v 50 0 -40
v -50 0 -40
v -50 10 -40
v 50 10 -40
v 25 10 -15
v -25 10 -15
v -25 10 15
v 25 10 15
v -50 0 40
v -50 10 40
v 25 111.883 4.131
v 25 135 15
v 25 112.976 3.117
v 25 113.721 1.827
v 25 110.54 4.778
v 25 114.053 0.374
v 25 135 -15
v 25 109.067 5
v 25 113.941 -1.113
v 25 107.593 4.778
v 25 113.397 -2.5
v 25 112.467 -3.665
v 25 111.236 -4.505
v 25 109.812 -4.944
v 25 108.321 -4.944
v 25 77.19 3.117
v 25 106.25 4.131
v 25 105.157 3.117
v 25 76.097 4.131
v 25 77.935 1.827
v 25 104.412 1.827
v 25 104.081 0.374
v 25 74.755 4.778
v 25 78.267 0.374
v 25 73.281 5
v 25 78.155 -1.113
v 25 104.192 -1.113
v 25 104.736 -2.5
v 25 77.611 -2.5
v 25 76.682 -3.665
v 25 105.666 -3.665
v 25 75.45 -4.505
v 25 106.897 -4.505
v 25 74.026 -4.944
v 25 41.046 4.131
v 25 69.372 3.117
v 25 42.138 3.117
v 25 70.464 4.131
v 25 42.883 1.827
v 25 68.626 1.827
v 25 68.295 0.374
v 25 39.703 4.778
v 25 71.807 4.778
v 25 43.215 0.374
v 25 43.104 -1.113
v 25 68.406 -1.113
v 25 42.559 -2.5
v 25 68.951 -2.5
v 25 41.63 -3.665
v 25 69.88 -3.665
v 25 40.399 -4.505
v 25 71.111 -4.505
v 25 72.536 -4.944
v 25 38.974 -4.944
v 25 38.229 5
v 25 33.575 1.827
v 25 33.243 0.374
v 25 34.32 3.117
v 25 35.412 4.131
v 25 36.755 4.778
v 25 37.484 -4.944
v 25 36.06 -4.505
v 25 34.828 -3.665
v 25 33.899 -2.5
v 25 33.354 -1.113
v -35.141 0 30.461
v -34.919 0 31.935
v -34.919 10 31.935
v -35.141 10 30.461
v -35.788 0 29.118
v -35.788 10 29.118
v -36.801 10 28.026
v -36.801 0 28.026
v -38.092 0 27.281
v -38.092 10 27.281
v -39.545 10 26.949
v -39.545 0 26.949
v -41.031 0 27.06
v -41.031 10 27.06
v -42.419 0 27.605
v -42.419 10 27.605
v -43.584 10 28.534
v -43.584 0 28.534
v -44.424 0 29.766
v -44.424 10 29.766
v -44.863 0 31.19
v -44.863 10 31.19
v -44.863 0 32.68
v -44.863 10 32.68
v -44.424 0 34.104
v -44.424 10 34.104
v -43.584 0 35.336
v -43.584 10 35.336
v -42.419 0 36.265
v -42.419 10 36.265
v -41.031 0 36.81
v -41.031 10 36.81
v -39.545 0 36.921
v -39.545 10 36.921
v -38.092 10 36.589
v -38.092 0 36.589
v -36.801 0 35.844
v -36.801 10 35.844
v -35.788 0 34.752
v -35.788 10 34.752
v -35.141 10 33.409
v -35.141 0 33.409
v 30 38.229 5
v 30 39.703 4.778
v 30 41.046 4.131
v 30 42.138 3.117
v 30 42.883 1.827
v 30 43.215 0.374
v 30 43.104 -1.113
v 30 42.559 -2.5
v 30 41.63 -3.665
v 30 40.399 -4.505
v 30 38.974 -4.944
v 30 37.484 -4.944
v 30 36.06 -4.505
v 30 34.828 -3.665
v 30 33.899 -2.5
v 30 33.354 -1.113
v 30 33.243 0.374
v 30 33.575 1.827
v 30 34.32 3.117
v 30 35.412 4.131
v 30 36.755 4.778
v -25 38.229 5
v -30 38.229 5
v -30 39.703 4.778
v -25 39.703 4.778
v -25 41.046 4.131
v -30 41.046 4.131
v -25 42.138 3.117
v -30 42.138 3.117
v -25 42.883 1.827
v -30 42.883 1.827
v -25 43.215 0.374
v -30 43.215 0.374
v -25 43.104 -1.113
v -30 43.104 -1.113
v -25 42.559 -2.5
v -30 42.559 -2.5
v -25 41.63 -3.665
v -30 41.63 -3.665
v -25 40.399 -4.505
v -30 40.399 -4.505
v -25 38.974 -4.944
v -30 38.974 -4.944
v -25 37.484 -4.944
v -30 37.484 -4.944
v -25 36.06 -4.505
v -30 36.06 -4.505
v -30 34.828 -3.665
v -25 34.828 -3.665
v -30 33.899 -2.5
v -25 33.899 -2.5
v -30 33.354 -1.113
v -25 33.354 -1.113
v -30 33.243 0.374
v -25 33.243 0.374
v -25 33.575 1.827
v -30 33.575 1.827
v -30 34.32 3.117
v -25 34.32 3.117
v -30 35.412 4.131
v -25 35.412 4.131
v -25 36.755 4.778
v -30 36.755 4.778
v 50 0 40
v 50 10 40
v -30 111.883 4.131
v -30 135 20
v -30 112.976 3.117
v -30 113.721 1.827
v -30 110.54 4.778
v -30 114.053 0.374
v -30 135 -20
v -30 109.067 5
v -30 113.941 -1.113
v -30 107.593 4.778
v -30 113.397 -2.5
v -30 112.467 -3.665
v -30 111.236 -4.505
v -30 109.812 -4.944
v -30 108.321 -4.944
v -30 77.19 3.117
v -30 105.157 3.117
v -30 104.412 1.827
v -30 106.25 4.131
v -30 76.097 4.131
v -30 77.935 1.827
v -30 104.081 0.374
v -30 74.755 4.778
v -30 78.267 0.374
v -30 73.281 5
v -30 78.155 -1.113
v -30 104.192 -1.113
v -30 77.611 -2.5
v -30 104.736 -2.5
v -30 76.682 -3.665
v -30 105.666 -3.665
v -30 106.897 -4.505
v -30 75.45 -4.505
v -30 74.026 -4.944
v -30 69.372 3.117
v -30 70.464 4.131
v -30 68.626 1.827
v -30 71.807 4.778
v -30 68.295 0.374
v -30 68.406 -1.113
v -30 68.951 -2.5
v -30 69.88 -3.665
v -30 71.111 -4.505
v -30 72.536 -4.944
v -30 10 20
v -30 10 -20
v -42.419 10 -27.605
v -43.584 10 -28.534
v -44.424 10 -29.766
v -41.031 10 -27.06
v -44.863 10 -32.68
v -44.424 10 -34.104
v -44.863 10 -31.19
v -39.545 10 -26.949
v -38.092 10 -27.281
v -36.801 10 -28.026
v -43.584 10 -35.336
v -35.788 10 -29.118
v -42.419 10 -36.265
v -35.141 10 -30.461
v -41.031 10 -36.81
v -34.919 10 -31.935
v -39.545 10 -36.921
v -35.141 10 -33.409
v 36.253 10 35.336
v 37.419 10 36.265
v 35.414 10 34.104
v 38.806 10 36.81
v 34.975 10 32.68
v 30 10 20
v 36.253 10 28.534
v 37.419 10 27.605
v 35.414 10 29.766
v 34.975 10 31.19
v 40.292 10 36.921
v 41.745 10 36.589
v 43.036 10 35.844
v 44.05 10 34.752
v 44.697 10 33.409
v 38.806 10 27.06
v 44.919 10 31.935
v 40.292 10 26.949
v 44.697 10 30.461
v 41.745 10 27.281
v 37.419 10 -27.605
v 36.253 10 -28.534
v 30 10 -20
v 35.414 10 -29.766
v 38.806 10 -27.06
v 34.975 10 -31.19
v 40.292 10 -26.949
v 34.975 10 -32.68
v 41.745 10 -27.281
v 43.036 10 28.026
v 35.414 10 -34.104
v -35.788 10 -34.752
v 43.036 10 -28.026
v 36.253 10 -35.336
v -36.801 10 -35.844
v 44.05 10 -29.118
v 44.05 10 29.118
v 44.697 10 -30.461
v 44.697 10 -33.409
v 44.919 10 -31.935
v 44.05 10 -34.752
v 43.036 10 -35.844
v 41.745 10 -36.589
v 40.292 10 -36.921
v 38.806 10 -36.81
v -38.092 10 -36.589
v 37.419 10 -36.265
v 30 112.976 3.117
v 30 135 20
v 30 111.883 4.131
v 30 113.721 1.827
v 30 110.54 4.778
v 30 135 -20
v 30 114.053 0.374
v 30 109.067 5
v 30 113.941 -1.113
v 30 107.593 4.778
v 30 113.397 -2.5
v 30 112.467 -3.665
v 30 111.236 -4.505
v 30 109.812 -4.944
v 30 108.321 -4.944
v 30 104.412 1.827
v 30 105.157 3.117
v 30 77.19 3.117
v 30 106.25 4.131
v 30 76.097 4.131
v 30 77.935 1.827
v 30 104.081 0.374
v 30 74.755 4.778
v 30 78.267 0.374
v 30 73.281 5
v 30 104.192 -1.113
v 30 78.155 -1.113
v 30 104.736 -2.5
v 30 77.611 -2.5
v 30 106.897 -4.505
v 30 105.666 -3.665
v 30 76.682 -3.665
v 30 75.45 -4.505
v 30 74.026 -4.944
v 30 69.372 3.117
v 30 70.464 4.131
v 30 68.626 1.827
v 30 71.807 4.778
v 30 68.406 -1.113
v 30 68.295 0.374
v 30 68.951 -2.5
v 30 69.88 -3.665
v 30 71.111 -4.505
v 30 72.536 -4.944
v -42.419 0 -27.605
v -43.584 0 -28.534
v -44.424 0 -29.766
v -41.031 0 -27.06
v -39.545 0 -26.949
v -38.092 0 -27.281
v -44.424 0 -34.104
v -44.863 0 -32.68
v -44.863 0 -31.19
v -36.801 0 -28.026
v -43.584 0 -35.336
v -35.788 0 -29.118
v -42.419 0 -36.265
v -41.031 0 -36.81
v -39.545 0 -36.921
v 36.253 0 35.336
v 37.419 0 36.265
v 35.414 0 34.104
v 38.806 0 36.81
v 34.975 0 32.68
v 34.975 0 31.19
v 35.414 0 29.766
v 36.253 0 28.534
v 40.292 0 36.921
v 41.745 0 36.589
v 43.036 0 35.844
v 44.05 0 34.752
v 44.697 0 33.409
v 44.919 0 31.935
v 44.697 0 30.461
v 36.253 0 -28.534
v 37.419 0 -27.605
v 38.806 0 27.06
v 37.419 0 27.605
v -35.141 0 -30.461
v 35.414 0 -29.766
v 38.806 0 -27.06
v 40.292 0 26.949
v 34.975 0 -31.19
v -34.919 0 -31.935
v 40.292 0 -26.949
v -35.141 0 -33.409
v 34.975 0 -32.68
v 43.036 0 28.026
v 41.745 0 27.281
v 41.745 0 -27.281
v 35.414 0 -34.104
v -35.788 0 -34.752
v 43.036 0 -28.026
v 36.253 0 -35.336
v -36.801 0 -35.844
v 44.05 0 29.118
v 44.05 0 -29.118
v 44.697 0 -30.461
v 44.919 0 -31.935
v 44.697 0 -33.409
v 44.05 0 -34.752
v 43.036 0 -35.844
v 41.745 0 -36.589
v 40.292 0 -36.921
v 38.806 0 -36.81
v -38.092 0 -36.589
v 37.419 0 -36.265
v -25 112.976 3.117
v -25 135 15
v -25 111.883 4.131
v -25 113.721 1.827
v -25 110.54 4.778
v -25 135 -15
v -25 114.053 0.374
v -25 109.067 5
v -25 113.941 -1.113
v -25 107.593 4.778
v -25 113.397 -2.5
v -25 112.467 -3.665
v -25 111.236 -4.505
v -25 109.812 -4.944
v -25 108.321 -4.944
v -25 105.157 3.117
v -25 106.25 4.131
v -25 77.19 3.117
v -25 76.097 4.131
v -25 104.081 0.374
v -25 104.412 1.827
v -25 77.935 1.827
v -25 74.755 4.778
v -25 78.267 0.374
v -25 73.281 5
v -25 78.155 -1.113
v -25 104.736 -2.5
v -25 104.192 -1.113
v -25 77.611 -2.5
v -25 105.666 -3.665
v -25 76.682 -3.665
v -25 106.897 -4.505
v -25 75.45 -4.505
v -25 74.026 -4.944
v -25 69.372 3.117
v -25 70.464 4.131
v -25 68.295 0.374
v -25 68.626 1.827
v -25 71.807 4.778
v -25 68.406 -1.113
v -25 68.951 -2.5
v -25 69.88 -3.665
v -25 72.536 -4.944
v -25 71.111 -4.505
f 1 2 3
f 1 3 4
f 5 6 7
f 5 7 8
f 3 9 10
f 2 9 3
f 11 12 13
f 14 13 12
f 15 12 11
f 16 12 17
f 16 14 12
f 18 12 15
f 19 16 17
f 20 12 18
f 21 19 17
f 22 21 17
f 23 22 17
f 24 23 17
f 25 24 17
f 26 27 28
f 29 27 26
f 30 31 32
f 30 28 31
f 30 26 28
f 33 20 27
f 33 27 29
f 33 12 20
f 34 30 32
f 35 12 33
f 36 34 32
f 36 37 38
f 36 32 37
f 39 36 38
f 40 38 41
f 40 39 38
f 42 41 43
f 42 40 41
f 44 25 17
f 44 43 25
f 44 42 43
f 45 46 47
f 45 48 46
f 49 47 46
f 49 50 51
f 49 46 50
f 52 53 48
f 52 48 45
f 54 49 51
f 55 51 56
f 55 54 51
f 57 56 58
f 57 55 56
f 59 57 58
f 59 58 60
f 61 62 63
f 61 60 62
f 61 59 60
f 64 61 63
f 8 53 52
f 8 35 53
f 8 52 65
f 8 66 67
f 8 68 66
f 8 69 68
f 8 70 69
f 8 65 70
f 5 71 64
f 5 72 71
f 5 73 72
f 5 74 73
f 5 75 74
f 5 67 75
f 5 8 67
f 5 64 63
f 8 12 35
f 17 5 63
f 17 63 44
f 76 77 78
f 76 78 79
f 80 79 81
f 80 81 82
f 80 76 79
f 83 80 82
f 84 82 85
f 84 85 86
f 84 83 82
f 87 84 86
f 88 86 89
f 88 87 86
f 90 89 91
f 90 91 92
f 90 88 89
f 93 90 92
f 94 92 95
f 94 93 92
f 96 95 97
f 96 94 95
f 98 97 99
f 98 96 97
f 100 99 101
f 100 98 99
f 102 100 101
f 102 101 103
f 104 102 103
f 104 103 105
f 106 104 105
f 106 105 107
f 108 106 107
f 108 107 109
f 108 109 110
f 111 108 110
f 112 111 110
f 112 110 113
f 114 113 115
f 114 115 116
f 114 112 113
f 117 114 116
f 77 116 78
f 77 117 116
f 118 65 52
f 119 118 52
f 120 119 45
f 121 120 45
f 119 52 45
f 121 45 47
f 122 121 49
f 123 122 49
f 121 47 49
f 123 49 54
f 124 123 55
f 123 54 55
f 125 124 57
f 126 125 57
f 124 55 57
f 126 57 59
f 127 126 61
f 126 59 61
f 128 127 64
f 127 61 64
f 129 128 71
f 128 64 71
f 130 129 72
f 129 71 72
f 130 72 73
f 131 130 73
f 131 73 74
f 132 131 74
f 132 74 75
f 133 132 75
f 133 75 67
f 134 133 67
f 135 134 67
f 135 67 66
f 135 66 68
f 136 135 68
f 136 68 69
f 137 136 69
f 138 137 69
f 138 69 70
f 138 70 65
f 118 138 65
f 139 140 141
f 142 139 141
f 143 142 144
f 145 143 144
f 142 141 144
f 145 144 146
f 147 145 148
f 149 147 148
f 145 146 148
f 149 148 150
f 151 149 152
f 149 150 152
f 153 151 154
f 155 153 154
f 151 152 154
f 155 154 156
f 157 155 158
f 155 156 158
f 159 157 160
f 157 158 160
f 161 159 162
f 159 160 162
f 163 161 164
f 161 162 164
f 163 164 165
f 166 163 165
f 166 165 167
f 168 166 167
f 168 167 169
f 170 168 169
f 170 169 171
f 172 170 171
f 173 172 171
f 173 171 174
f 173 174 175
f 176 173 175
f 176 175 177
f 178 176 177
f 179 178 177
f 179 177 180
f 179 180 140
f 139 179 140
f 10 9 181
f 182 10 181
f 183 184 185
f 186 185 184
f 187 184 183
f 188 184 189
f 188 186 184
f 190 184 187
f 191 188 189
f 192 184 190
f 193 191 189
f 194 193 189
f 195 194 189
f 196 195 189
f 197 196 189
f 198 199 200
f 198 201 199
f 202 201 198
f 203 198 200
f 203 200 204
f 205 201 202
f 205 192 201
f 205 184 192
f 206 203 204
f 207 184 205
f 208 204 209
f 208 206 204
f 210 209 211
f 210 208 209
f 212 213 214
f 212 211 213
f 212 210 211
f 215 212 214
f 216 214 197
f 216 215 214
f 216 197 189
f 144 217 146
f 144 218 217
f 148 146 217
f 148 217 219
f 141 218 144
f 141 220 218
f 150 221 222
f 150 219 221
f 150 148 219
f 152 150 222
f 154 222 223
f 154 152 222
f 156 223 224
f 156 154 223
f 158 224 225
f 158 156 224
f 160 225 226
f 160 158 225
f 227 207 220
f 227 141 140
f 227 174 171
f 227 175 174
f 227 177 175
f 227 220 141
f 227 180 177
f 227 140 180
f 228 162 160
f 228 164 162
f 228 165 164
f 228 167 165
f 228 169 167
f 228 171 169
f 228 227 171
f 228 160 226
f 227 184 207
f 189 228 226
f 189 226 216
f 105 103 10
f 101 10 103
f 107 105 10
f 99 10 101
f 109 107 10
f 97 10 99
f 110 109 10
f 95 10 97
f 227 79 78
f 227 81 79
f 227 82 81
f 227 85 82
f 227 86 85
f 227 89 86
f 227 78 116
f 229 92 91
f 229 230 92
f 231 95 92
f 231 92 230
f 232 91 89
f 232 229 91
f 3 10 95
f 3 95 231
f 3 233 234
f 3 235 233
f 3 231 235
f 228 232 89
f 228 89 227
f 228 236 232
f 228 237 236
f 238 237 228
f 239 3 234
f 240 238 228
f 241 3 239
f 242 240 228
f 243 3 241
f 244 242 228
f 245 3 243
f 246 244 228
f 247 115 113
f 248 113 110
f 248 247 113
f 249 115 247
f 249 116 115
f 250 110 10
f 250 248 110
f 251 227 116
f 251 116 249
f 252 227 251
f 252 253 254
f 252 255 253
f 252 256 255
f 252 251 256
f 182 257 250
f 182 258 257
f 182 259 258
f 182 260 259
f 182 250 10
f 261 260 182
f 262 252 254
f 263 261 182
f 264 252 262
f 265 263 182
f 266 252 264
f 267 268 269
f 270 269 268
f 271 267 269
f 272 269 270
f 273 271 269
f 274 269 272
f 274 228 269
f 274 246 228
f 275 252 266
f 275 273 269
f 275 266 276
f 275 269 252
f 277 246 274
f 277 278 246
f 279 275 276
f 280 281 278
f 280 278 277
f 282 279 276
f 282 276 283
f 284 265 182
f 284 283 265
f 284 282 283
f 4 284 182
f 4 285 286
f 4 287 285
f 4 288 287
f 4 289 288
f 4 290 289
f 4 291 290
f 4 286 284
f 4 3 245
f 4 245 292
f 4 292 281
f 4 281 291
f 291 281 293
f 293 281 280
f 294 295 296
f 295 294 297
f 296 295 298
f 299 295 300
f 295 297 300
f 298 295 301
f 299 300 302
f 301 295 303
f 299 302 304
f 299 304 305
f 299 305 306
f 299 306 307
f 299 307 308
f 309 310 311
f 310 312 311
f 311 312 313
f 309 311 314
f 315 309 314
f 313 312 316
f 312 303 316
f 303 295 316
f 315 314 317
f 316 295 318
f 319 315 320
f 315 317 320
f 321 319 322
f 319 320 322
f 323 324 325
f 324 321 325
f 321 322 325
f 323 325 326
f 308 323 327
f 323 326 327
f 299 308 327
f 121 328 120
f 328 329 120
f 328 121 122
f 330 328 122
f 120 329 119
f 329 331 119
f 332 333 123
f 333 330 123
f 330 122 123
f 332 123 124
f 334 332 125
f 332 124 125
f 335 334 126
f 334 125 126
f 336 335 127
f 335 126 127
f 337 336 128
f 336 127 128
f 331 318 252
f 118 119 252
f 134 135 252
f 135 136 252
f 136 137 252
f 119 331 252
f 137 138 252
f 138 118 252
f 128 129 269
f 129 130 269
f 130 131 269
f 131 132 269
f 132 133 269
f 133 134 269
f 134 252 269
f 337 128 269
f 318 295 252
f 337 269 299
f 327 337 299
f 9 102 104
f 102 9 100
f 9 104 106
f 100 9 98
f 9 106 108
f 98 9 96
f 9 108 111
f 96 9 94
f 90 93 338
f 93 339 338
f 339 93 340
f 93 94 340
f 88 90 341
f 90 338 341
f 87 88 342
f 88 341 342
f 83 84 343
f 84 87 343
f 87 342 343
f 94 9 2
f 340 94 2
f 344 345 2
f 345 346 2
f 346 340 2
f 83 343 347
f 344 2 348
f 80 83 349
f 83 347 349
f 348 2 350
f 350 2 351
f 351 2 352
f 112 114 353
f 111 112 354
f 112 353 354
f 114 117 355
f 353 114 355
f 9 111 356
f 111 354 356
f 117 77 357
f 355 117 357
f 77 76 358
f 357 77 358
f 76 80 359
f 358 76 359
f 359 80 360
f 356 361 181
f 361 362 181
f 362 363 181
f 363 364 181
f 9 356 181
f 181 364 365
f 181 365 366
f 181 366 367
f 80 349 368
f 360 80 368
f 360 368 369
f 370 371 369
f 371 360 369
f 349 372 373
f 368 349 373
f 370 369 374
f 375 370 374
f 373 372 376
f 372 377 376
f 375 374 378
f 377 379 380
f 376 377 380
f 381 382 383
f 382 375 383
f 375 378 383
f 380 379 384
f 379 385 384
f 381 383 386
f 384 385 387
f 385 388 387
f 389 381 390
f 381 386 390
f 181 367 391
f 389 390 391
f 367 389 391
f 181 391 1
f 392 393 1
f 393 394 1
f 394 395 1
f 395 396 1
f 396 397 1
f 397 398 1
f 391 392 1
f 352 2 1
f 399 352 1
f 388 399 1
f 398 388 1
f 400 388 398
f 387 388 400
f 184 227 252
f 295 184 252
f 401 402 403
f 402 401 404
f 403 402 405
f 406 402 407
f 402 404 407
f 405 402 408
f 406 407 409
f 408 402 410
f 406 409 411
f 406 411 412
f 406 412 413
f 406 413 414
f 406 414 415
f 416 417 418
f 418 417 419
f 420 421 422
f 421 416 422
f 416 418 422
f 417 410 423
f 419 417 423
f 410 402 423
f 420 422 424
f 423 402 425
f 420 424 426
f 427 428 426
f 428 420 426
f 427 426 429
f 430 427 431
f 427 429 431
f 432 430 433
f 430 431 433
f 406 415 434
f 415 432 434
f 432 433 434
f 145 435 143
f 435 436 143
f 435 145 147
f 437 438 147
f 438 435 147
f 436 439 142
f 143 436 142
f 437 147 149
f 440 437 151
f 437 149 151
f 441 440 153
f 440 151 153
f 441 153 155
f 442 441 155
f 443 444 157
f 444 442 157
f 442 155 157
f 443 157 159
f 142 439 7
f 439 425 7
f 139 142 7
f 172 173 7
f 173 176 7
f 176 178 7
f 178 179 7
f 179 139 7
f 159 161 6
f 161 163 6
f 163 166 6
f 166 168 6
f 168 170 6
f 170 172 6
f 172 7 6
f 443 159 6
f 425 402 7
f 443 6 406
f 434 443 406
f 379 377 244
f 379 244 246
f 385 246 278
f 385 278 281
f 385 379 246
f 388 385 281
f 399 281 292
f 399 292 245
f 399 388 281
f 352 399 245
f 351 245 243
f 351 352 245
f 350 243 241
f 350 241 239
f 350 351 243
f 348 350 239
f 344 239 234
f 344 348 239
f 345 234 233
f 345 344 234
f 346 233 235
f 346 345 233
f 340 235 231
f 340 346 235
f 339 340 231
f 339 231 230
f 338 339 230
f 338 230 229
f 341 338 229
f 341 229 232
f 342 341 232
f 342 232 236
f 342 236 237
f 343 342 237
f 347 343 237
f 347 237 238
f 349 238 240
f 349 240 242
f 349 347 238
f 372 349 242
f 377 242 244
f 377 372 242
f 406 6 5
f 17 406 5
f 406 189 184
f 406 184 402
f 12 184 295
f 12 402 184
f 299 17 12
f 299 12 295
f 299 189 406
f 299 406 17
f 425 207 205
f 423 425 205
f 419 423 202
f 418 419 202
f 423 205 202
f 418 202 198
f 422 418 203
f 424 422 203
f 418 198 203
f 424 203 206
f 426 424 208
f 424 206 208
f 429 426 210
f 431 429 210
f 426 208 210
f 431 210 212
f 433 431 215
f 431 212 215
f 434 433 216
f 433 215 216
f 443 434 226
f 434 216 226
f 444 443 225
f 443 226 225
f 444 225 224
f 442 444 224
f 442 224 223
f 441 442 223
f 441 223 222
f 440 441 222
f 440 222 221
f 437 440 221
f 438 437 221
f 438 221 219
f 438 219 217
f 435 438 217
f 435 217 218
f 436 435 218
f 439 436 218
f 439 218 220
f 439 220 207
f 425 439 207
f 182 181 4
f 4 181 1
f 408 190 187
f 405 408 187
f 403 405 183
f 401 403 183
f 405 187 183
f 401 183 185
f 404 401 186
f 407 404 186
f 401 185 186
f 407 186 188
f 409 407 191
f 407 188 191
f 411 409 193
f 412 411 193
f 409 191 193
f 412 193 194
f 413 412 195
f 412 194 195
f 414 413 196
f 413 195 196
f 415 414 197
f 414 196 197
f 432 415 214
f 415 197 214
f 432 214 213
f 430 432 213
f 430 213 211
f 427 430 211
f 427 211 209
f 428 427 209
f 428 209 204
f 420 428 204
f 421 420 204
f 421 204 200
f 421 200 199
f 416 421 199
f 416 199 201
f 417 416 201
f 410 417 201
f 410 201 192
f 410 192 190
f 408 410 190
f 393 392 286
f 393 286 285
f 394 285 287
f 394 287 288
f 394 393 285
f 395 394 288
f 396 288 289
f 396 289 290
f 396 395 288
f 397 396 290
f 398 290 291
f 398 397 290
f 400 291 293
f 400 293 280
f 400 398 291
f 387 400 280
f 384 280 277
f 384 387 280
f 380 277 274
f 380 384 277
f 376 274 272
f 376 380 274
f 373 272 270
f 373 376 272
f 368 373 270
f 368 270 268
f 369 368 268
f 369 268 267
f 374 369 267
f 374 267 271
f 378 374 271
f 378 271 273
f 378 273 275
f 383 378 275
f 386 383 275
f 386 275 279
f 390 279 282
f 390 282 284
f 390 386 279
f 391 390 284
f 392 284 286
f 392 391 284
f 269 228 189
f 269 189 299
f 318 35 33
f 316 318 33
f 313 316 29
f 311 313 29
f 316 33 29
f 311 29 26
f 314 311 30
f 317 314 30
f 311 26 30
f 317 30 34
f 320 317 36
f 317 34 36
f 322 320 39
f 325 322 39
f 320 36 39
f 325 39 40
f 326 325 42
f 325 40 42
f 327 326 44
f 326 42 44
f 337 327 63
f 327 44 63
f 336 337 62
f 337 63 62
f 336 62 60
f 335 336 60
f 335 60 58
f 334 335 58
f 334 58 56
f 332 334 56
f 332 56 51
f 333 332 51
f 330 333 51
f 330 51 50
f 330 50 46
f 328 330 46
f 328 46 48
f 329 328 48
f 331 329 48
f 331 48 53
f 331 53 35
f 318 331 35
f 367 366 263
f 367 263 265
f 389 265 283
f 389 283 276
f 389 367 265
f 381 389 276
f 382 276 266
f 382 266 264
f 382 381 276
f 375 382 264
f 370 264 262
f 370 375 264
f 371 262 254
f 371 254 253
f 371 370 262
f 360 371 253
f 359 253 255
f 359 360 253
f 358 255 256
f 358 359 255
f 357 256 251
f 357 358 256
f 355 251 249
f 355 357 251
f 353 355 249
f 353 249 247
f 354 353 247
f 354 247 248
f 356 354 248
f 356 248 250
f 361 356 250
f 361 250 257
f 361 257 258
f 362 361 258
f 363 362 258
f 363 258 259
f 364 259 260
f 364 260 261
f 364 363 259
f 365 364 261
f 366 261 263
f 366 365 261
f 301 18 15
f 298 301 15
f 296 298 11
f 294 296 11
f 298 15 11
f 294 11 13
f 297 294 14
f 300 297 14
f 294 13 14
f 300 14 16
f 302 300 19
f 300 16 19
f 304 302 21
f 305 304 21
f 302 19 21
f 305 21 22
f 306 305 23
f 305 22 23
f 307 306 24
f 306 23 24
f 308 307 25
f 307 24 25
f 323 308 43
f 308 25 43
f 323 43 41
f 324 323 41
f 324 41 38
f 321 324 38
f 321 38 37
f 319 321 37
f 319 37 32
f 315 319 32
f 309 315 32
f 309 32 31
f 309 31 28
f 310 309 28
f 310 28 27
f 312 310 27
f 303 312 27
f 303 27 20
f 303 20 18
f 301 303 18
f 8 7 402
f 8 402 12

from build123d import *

# Parameters (mm, degrees)
SZKIC1_W                          = 100
SZKIC1_H                          = 80
SZKIC1_R                          = 5
DODANIE_WYCI_GNI_CIE1_DEPTH       = 10
SZKIC2_W                          = 60
SZKIC2_H                          = 40
SZKIC2_W_2                        = 50
SZKIC2_H_2                        = 30
WYCI_GNI_CIE_CIENKA_CIANKA1_DEPTH = 125
SZKIC3_R                          = 5
WYTNIJ_WYCI_GNI_CIE1_DEPTH        = 125


with BuildPart() as part:
    # Szkic1 → Dodanie-wyciągnięcie1 (new body)
    with BuildSketch(Plane(origin=(0, 0, 0), x_dir=(1, 0, 0), z_dir=(0, 1, 0))):
        Rectangle(SZKIC1_W, SZKIC1_H)
        with Locations((-39.918726622, 31.934981298)):
            Circle(SZKIC1_R, mode=Mode.SUBTRACT)
        with Locations((39.918726622, 31.934981298)):
            Circle(SZKIC1_R, mode=Mode.SUBTRACT)
        with Locations((39.918726622, -31.934981298)):
            Circle(SZKIC1_R, mode=Mode.SUBTRACT)
        with Locations((-39.918726622, -31.934981298)):
            Circle(SZKIC1_R, mode=Mode.SUBTRACT)
    extrude(amount=DODANIE_WYCI_GNI_CIE1_DEPTH)

    # Szkic2 → Wyciągnięcie-cienka ścianka1 (add)
    with BuildSketch(Plane(origin=(0, 10, 0), x_dir=(1, 0, 0), z_dir=(0, 1, 0))):
        Rectangle(SZKIC2_W, SZKIC2_H)
        Rectangle(SZKIC2_W_2, SZKIC2_H_2, mode=Mode.SUBTRACT)
    extrude(amount=WYCI_GNI_CIE_CIENKA_CIANKA1_DEPTH)

    # Szkic3 → Wytnij-wyciągnięcie1 (cut)
    with BuildSketch(Plane.ZY.offset(30)):
        with Locations((0, 38.229088524)):
            Circle(SZKIC3_R)
        with Locations((0, 73.280775621)):
            Circle(SZKIC3_R)
        with Locations((0, 109.066529463)):
            Circle(SZKIC3_R)
    extrude(amount=-WYTNIJ_WYCI_GNI_CIE1_DEPTH, mode=Mode.SUBTRACT)


solid = part.part
